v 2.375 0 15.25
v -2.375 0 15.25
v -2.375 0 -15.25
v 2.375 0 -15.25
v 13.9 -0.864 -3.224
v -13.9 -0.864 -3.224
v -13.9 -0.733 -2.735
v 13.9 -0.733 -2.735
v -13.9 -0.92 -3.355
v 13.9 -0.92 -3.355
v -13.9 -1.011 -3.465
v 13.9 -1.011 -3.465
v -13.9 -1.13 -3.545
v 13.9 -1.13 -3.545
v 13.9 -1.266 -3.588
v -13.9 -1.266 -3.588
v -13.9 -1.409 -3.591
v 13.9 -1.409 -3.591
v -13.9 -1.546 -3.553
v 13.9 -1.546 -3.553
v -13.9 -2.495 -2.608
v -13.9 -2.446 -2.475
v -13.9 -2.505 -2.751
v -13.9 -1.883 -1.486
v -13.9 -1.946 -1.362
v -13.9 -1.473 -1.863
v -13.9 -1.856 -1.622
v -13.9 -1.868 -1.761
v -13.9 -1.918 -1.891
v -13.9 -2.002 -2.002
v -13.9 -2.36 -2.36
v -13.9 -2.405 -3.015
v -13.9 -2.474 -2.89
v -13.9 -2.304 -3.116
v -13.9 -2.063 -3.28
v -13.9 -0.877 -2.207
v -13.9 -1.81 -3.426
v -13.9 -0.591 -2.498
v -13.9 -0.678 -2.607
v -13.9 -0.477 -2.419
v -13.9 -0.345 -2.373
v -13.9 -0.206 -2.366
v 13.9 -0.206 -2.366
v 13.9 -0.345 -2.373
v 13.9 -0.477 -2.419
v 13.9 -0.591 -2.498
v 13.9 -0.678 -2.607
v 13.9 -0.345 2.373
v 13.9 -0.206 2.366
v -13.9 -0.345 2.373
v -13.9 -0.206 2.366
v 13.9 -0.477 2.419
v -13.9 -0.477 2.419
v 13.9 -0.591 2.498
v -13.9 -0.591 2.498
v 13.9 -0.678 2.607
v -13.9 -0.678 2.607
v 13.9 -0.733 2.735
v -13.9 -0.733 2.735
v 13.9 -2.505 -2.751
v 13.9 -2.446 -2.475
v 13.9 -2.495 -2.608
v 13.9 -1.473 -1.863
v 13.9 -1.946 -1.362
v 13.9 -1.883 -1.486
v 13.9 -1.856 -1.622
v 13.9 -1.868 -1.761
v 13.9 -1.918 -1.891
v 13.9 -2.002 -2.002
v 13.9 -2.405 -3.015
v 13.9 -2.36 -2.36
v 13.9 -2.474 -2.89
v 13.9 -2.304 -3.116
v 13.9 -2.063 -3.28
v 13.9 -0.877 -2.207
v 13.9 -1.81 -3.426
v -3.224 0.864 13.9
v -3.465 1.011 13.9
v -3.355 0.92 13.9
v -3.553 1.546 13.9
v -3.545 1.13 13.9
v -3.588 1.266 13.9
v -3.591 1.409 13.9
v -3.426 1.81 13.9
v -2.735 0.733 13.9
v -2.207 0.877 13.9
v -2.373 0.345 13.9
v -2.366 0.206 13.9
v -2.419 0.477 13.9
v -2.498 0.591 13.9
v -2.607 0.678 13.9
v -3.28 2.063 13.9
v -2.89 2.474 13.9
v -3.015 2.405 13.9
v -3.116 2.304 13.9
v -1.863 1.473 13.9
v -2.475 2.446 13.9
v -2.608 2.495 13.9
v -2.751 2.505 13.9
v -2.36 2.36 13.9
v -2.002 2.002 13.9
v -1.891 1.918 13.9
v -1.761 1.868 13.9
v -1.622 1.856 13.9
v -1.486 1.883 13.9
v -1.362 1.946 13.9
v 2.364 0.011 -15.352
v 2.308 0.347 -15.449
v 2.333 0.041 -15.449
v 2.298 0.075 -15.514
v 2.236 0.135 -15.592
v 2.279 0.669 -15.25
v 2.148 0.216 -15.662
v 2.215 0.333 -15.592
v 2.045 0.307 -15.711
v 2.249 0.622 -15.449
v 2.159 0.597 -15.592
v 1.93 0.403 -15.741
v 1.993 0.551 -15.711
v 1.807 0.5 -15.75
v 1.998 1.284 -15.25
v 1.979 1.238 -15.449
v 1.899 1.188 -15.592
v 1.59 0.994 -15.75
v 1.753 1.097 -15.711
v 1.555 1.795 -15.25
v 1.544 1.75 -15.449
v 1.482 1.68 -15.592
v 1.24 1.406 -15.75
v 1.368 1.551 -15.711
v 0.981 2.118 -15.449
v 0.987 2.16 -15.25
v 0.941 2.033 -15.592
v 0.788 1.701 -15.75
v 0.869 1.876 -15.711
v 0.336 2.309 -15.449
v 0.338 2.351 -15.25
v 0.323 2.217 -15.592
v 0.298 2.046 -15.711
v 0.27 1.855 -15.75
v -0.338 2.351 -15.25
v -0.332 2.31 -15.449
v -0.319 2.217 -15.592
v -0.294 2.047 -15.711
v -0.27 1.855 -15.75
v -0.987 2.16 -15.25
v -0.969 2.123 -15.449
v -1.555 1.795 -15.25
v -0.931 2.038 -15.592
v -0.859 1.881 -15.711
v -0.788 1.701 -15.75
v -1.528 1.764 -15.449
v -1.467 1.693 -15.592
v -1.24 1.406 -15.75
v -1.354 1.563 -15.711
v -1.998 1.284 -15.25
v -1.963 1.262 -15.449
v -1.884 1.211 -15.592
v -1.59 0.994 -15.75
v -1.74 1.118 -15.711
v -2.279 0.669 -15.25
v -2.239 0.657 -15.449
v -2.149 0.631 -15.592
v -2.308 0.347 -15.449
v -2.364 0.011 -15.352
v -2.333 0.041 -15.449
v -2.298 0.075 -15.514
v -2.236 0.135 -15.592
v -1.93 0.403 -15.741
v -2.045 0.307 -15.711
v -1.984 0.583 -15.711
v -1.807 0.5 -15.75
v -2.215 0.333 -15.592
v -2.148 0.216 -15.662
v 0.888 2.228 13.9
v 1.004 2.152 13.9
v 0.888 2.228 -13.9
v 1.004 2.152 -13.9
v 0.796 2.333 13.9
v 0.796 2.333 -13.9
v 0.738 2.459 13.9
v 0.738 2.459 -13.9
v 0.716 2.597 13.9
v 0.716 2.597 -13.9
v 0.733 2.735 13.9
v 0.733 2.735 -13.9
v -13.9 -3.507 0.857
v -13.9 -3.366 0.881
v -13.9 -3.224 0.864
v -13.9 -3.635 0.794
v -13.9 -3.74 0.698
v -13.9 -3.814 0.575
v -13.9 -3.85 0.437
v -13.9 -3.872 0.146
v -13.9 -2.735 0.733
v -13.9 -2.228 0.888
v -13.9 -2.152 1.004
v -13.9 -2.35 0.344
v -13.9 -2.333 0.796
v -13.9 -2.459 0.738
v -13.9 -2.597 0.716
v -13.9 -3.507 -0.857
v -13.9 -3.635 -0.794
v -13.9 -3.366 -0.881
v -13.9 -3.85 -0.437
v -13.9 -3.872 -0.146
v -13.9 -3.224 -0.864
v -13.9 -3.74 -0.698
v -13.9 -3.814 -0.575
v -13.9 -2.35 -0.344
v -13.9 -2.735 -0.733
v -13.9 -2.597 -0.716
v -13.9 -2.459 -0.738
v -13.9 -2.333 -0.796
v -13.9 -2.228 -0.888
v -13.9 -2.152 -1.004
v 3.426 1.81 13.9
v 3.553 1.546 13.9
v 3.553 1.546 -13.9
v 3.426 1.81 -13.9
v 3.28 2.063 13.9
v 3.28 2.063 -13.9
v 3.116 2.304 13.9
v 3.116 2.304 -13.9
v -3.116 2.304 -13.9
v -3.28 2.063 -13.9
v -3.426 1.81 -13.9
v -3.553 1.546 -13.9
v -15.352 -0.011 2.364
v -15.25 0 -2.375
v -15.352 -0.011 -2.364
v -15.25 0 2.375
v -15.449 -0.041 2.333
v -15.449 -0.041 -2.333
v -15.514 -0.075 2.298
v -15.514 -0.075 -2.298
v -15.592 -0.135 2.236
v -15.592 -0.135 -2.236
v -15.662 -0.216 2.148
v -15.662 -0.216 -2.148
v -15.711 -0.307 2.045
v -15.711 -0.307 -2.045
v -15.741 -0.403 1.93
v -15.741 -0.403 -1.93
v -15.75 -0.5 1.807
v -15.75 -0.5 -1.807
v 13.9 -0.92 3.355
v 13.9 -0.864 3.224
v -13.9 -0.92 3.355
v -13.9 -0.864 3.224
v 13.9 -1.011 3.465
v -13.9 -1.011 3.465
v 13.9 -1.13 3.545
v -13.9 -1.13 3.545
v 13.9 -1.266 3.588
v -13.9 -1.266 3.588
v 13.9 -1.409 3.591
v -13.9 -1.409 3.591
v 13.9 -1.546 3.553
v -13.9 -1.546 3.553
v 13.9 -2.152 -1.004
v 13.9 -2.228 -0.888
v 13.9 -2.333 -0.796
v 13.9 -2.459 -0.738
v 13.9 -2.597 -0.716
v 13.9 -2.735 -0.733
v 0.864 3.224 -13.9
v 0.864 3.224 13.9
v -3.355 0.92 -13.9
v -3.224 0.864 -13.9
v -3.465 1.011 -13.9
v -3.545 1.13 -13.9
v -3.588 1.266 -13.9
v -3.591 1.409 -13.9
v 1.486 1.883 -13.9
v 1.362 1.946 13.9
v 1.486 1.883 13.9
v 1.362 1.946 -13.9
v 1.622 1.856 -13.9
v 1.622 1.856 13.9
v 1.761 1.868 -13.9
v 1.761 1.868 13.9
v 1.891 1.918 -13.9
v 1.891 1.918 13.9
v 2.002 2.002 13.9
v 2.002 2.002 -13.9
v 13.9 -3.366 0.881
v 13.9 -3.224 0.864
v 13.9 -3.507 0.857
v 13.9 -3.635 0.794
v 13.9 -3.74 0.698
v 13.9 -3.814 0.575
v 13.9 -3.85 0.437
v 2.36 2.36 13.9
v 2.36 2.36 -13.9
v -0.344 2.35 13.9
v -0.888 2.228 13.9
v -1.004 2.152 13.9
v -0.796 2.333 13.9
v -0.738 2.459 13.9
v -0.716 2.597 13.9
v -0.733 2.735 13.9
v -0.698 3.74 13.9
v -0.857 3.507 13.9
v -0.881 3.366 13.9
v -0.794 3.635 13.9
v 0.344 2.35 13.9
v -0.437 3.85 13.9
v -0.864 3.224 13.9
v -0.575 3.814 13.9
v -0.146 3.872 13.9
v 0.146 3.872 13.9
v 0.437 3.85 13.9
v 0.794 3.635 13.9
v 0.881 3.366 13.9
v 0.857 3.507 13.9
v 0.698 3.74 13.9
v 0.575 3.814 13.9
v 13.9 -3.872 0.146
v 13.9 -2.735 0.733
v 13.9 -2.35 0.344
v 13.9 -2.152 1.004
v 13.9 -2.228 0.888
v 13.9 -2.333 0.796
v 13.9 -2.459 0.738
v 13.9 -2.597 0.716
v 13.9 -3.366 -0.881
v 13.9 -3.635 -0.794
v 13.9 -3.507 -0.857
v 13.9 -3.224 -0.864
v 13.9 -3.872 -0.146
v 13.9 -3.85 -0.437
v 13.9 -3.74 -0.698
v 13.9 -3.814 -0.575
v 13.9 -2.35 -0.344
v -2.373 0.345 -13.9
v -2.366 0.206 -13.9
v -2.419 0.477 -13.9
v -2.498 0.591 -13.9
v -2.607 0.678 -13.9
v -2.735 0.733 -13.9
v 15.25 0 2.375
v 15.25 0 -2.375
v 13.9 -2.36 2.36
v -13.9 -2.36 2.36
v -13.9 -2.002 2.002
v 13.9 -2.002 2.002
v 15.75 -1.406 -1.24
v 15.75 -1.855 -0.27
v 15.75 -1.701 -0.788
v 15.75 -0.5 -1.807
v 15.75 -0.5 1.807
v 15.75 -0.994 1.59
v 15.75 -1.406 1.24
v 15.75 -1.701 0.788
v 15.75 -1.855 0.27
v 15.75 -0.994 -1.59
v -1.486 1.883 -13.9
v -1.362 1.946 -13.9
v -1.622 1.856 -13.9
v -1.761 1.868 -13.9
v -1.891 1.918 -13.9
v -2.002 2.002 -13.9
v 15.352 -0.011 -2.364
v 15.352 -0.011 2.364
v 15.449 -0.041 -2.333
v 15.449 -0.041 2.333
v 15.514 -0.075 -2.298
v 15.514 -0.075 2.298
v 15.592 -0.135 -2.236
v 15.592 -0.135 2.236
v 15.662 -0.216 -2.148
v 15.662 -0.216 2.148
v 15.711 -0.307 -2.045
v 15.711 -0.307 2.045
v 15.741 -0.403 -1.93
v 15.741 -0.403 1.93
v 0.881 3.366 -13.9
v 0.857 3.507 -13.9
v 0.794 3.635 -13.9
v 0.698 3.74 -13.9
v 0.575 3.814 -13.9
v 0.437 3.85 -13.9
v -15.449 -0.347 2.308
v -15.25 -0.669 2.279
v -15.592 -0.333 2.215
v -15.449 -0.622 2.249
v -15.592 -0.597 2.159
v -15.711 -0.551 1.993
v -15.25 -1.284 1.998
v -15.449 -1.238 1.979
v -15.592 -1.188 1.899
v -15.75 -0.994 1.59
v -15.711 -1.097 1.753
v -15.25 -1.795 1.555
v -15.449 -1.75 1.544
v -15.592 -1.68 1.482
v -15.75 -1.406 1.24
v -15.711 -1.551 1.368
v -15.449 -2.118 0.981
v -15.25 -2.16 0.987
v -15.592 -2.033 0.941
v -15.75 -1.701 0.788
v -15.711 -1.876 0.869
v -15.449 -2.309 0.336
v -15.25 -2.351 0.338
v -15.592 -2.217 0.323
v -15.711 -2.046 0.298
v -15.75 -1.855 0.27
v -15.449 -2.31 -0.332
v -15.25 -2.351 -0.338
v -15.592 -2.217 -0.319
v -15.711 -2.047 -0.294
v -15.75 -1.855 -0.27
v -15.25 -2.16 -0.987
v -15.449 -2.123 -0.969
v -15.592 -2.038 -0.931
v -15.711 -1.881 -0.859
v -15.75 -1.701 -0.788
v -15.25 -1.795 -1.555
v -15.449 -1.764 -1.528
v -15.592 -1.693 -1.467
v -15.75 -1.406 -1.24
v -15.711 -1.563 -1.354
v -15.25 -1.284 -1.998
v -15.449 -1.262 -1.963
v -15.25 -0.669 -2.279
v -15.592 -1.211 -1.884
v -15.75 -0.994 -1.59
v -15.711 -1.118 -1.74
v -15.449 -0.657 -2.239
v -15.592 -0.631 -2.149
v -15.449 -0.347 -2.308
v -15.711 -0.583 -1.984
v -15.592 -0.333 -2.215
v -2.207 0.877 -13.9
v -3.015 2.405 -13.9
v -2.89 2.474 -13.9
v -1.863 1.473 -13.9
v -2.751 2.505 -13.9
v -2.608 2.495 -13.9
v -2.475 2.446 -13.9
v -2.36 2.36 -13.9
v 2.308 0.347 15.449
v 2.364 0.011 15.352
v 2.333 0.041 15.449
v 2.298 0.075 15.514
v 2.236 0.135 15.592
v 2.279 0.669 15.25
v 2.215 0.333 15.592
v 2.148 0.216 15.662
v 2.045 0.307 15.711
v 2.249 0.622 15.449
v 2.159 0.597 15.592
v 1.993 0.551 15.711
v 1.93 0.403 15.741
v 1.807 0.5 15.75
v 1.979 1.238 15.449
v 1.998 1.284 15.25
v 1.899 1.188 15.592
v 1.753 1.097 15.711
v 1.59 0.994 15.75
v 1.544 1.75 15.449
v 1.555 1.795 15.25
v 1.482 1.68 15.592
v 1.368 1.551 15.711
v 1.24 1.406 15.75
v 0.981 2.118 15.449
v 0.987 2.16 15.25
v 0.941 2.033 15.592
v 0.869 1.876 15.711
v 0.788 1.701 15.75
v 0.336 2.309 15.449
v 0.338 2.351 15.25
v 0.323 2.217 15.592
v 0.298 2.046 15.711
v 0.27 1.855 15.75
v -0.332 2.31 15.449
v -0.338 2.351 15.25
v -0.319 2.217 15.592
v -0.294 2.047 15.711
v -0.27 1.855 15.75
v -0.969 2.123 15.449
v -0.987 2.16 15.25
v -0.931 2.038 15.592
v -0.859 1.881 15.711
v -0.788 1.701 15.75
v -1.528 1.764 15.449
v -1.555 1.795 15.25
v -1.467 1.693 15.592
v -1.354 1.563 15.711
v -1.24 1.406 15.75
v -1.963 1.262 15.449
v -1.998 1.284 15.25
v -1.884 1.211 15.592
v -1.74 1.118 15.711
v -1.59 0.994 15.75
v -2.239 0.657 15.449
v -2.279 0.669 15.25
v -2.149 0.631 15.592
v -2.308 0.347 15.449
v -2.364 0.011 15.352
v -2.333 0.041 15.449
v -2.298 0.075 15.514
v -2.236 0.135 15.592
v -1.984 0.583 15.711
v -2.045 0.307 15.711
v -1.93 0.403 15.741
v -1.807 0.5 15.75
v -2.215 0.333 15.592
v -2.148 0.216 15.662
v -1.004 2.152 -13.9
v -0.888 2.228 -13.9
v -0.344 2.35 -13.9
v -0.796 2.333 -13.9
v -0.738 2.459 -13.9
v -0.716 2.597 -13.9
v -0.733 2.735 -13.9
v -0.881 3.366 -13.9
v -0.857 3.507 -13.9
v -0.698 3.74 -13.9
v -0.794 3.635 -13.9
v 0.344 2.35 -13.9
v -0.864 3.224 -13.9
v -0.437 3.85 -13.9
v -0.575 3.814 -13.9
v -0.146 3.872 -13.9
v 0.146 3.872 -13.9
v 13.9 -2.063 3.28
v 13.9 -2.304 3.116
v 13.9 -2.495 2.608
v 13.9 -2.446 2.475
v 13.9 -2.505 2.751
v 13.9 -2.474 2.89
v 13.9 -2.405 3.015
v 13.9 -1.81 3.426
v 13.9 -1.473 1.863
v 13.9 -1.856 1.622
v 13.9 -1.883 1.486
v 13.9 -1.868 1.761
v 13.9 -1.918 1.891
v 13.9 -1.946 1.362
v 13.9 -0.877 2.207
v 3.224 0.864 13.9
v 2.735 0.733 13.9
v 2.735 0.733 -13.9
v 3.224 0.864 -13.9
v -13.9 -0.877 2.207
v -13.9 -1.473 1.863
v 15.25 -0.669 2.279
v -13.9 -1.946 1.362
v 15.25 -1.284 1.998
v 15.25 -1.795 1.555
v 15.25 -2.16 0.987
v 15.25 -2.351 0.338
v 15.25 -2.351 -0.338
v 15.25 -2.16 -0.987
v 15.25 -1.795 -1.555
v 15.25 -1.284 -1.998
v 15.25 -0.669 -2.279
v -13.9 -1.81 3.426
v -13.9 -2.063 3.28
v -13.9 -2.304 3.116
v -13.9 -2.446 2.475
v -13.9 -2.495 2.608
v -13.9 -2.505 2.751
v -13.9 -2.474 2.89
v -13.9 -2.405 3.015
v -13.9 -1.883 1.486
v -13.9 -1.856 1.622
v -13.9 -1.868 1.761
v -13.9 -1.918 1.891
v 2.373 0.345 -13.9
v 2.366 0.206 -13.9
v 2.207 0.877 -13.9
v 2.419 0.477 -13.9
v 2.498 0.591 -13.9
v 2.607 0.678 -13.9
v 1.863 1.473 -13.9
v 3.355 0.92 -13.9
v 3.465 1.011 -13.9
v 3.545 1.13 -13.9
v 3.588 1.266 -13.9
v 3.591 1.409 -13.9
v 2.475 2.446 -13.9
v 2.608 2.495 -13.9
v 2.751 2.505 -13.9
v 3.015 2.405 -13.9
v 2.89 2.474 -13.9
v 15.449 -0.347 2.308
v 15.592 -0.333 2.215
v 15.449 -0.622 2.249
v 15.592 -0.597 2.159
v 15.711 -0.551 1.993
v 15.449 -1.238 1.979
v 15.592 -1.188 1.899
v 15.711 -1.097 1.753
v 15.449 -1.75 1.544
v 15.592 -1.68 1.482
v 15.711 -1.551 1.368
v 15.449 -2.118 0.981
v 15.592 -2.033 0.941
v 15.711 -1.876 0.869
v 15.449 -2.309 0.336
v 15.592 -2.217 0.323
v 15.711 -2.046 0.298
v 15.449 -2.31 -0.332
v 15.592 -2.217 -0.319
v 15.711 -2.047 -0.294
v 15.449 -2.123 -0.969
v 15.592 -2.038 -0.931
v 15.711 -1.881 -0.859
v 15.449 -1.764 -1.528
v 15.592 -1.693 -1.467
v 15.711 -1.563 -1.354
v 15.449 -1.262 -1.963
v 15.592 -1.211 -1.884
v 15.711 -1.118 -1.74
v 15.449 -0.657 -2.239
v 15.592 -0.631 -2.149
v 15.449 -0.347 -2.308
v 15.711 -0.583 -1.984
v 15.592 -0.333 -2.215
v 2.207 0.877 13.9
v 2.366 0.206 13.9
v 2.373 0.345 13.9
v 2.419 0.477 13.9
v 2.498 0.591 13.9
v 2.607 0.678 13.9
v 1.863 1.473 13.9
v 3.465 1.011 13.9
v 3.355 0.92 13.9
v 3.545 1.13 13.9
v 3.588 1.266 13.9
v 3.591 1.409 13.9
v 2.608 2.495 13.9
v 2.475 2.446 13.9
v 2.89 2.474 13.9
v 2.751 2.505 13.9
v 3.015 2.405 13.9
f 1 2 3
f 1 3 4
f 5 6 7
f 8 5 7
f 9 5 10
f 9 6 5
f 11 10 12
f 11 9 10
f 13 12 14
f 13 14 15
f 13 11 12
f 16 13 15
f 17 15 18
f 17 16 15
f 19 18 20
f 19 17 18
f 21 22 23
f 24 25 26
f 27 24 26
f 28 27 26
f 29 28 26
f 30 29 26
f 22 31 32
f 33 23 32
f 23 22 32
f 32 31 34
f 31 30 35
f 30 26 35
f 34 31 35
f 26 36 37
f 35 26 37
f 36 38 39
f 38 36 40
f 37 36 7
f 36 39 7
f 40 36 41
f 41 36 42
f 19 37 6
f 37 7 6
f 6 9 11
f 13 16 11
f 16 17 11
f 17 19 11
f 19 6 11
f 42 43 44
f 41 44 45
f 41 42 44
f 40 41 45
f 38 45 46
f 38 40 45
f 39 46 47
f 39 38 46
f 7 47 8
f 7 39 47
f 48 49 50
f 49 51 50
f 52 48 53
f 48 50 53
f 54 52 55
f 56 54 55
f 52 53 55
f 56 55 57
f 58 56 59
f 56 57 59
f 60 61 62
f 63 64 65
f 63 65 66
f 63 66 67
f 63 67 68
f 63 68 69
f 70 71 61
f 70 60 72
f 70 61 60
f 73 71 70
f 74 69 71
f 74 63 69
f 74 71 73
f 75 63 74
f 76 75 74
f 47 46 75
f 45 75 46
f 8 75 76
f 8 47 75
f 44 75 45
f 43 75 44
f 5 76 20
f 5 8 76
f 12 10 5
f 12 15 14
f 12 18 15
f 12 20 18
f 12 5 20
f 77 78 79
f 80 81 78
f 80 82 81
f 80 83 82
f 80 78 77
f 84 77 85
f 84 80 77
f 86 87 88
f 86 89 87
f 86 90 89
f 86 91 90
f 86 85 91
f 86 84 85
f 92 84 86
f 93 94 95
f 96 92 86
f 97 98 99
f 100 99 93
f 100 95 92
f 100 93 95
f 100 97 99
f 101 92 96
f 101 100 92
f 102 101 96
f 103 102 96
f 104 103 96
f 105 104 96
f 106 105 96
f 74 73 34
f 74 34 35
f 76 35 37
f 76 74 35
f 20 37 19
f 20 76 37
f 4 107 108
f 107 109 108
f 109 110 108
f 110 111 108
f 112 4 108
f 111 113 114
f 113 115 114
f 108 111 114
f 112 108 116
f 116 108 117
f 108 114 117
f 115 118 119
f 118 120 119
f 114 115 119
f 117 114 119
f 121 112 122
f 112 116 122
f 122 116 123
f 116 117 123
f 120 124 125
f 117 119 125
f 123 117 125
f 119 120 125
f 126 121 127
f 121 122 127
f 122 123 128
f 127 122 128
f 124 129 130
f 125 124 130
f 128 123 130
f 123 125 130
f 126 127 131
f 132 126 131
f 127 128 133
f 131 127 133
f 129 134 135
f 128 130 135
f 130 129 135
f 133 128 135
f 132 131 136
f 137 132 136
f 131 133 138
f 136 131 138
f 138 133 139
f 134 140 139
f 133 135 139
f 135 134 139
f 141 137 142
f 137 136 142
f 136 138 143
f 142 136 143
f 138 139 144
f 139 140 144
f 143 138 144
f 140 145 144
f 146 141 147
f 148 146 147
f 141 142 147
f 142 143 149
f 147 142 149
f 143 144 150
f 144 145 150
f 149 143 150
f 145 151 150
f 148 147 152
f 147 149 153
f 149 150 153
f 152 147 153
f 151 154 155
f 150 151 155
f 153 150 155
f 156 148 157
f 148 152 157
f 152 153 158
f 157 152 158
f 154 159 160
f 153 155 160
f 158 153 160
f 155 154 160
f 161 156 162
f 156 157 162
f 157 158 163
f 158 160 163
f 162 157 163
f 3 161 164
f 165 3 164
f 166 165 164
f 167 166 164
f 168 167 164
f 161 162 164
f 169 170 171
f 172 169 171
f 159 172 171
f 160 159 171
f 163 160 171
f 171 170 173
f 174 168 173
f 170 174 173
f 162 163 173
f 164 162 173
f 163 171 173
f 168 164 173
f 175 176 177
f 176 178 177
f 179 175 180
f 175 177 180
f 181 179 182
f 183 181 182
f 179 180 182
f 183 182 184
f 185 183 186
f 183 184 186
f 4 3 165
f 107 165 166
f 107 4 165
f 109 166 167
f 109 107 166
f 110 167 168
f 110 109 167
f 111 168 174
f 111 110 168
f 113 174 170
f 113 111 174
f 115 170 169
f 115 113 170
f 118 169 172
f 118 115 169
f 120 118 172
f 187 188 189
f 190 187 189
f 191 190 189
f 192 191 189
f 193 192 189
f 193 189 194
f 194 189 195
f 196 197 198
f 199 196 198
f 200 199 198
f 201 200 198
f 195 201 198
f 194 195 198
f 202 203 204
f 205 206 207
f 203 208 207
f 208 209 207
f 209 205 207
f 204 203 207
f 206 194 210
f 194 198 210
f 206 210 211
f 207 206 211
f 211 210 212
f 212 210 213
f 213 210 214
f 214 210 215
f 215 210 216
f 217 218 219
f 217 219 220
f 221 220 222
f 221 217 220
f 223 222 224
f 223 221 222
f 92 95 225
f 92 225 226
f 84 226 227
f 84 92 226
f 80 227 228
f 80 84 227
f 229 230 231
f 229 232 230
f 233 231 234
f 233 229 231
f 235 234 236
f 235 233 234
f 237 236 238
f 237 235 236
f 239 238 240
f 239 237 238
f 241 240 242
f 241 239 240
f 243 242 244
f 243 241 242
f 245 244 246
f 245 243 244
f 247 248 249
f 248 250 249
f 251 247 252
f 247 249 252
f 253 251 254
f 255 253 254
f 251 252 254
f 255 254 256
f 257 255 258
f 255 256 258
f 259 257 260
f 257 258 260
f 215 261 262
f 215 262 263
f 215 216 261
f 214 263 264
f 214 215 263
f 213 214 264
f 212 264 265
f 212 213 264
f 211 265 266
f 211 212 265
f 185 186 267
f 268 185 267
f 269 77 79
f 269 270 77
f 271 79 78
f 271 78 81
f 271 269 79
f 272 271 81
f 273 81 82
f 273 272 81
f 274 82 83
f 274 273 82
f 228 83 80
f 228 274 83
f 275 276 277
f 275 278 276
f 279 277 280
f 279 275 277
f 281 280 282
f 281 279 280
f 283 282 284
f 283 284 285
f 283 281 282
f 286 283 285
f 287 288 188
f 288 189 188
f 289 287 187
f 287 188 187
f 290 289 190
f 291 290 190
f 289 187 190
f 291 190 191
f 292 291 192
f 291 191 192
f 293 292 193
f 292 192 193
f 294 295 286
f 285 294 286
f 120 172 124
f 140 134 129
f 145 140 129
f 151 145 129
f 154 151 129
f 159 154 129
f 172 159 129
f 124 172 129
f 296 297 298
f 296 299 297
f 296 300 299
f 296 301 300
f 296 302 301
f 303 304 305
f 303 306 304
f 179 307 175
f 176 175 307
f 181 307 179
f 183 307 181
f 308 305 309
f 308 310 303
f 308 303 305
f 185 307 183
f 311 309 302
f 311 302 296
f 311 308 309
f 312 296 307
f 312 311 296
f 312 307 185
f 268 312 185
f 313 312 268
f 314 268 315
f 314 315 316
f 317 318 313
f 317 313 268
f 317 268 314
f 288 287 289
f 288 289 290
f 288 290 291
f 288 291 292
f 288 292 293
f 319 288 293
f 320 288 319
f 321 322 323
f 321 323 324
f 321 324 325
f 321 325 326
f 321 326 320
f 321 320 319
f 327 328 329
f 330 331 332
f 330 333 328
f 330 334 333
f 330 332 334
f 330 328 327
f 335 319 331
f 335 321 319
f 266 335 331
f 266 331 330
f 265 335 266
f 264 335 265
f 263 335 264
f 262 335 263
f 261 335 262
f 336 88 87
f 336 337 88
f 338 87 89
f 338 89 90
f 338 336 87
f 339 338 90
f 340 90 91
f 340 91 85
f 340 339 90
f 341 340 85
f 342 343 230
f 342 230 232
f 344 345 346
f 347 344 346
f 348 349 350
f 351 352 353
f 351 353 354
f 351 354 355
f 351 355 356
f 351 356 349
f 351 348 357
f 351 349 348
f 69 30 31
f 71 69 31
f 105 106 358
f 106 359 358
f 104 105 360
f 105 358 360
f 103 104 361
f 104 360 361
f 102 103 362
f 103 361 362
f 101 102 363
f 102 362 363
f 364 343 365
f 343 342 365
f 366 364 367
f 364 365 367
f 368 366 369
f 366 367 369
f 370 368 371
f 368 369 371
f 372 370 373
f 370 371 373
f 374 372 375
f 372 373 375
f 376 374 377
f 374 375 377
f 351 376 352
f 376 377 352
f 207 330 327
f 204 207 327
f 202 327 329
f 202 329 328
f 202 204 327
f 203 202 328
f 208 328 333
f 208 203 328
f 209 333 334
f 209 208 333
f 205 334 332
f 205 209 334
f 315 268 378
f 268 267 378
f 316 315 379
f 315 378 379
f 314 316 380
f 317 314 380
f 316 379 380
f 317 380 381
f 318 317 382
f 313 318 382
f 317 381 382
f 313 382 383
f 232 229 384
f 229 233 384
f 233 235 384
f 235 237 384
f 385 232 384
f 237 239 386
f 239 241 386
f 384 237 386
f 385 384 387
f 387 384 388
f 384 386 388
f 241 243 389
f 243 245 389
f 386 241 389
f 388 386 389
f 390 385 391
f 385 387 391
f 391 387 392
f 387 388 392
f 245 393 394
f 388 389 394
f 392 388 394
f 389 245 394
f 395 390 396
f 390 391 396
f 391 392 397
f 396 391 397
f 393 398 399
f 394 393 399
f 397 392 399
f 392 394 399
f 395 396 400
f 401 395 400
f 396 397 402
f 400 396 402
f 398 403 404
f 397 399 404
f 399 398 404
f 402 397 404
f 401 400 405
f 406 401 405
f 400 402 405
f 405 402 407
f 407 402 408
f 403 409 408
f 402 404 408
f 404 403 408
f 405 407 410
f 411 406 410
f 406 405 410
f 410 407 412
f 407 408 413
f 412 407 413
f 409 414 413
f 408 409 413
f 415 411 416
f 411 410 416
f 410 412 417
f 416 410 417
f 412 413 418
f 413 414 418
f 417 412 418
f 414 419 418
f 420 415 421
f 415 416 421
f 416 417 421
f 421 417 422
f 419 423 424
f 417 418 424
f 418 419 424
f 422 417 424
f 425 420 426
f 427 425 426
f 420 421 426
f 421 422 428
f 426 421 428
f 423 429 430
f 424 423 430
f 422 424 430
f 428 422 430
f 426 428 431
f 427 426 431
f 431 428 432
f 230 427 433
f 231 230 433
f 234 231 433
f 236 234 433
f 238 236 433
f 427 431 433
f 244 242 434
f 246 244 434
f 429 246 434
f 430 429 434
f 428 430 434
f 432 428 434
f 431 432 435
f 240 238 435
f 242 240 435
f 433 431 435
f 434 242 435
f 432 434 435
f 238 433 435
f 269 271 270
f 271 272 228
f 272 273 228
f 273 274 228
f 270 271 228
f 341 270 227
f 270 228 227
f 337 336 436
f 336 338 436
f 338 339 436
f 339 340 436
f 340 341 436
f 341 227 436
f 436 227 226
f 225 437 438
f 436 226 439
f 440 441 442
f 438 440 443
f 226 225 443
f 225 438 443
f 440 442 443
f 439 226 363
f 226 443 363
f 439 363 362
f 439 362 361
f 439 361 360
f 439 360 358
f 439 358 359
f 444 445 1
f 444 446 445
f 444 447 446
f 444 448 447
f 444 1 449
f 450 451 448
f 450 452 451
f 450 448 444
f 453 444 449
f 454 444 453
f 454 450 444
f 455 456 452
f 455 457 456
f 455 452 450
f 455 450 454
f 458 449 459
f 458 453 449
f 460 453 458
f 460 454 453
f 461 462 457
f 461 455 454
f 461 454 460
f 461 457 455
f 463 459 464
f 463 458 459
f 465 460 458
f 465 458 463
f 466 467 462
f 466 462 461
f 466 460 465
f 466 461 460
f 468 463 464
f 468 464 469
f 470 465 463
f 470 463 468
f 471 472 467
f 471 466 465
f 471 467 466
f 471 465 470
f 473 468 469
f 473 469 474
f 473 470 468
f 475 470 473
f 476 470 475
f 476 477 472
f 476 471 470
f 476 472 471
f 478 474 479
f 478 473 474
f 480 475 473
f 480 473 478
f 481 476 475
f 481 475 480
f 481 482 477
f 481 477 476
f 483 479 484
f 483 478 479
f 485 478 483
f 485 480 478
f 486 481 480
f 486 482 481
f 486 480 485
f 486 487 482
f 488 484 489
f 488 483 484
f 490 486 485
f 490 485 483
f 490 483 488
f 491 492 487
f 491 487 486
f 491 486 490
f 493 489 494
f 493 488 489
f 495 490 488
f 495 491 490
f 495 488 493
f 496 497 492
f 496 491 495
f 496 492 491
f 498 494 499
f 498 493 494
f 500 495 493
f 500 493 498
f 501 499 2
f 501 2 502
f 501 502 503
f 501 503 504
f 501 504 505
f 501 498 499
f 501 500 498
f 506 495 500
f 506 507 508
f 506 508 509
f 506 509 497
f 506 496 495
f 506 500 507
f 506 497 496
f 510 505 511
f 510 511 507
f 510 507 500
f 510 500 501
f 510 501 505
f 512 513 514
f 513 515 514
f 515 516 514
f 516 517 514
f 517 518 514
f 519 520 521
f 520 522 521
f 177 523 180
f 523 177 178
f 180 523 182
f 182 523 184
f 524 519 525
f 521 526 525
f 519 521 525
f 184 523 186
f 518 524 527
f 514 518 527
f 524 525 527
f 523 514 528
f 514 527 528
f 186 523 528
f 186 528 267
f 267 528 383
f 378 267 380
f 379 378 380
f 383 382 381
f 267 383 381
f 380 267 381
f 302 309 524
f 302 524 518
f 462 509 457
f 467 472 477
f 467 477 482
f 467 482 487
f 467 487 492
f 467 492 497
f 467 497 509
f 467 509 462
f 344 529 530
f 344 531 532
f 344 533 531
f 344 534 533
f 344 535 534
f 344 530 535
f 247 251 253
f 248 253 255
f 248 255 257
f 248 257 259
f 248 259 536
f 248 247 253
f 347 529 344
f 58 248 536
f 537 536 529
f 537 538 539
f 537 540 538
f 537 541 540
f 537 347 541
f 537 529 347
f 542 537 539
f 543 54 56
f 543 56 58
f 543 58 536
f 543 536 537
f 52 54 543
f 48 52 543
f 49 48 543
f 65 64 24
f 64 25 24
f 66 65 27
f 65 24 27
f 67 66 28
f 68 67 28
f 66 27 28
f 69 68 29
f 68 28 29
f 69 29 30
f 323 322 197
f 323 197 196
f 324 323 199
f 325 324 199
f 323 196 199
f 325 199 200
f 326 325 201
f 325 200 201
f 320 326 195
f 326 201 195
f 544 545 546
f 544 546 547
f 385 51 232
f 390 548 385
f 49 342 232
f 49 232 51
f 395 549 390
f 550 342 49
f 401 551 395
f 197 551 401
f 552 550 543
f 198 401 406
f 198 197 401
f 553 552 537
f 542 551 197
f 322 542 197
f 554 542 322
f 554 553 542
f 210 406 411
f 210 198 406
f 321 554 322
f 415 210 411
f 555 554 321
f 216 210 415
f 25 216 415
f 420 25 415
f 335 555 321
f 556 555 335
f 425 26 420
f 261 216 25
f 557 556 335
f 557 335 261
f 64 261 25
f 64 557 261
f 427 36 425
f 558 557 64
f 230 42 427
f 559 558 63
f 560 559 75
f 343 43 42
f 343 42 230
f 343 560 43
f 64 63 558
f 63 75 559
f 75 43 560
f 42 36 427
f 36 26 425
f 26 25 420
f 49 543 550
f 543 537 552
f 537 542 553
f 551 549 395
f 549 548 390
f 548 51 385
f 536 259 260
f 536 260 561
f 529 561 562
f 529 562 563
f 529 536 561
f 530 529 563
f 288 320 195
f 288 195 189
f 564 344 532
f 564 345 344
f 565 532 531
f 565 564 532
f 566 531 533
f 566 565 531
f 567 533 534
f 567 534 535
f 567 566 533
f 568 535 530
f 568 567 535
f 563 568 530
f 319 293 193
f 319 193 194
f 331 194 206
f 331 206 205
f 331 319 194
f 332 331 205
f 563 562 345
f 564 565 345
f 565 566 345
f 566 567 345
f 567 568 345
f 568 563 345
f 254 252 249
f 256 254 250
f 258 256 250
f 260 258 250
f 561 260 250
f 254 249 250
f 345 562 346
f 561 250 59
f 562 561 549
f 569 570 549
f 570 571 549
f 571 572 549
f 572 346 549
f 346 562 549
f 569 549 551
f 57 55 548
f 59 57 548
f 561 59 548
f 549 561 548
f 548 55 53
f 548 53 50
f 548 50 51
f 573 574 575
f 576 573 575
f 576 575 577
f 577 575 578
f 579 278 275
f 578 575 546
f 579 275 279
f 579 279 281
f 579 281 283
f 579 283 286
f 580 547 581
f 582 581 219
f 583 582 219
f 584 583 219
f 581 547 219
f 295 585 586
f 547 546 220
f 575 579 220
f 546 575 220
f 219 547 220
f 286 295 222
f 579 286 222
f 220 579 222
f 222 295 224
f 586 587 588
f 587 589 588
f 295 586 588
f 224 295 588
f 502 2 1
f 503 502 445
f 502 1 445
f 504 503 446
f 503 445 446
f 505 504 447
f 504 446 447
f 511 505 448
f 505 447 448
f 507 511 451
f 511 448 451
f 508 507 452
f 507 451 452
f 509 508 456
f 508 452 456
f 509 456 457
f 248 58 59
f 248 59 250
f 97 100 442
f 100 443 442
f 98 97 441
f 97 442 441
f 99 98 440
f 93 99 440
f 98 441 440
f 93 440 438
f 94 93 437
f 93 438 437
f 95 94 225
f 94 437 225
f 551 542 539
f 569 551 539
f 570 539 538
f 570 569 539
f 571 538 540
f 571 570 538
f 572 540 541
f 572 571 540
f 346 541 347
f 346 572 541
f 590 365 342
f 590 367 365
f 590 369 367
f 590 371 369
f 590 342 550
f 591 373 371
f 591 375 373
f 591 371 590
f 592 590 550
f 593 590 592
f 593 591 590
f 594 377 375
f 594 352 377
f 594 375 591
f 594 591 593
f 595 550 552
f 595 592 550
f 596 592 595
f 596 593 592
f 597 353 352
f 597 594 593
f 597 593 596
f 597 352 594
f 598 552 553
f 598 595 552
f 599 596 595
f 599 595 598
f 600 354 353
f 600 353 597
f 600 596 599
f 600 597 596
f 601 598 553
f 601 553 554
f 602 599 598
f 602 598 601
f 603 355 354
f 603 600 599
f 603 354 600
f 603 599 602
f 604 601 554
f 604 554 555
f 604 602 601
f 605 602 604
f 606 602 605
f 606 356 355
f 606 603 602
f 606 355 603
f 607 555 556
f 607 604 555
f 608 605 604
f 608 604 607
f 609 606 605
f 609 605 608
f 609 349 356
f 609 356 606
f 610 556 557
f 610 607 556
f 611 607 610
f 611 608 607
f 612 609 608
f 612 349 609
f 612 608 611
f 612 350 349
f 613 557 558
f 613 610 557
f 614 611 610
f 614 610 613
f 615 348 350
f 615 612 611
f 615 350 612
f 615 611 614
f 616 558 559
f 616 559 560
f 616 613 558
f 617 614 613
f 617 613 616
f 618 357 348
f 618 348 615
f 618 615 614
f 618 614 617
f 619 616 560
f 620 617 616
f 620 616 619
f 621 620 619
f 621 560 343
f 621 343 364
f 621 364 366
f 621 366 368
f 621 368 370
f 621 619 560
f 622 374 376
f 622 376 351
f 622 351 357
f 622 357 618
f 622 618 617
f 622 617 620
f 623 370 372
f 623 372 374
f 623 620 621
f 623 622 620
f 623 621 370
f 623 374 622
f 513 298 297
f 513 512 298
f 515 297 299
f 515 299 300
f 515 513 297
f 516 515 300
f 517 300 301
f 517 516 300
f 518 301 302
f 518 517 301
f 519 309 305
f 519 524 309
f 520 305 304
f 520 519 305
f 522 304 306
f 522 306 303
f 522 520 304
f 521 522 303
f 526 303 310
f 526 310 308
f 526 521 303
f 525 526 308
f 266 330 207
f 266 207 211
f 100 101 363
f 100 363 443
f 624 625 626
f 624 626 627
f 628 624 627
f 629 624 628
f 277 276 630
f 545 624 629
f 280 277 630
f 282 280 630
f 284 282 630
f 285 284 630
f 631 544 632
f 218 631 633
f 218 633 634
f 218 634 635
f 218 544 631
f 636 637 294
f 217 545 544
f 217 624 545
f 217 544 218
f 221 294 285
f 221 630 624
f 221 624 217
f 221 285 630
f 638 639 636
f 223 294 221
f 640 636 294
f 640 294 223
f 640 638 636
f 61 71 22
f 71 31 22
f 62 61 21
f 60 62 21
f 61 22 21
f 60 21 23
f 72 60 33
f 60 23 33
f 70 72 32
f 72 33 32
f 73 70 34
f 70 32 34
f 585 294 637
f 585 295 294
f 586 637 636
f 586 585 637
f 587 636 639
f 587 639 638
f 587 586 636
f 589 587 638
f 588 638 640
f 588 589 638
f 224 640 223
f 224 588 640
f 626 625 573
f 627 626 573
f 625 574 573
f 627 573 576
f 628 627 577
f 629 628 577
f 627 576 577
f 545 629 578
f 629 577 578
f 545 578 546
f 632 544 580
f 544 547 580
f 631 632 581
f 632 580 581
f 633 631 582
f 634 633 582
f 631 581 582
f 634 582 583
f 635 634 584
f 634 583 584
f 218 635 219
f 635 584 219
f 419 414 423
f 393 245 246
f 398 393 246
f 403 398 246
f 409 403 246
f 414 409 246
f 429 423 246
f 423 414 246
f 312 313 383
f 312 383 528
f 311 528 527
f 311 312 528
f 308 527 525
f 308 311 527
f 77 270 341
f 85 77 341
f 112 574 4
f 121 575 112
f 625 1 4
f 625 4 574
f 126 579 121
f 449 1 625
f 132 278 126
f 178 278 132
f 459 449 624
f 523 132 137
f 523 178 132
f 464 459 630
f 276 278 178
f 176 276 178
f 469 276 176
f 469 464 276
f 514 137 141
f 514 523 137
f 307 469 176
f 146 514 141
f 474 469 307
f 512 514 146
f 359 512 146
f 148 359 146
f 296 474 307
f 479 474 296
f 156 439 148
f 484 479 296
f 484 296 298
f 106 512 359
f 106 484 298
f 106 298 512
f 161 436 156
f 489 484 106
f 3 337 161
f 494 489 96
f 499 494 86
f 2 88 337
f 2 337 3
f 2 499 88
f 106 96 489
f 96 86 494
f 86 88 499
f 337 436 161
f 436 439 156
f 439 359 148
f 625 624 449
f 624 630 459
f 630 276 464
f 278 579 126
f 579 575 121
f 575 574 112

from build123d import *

# Parameters (mm, degrees)
BOSS_EXTRUDE9_START  = 1.85
BOSS_EXTRUDE9_DEPTH  = 31.5
BOSS_EXTRUDE10_DEPTH = 27.8
FILLET4_R            = 0.5
BOSS_EXTRUDE11_DEPTH = 31.5
BOSS_EXTRUDE12_START = -1.85
BOSS_EXTRUDE12_DEPTH = 27.8
FILLET5_R            = 0.5


with BuildPart() as part:
    # Sketch10 → Boss-Extrude9 (new body)
    with BuildSketch(Plane(origin=(13.899999999999999, 0, 0), x_dir=(0, 0, -1), z_dir=(1, 0, 0)).offset(BOSS_EXTRUDE9_START)):
        with BuildLine():
            Line((2.375, 0), (-2.375, 0))
            ThreePointArc((-2.375, 0), (-2.3546815457628005, -0.30999970652261516), (-2.2940738374365415, -0.6146952321184724))
            ThreePointArc((-2.294073837436541, -0.6146952321184722), (-2.0568103339880484, -1.1874999999999882), (-1.679378605318059, -1.6793786053180417))
            ThreePointArc((-1.6793786053180593, -1.6793786053180415), (-1.1875000000000056, -2.0568103339880377), (-0.614695232118488, -2.294073837436537))
            ThreePointArc((-0.6146952321184879, -2.294073837436537), (8e-16, -2.375), (0.6146952321184889, -2.2940738374365366))
            ThreePointArc((0.6146952321184891, -2.2940738374365366), (1.1874999999999993, -2.0568103339880426), (1.6793786053180475, -1.679378605318053))
            ThreePointArc((1.679378605318047, -1.6793786053180533), (2.0568103339880404, -1.1875000000000027), (2.2940738374365366, -0.6146952321184884))
            ThreePointArc((2.294073837436536, -0.6146952321184882), (2.3546815457627996, -0.30999970652262326), (2.374999999999999, 1.5e-16))
        make_face()
    extrude(amount=-BOSS_EXTRUDE9_DEPTH)

    # Sketch10<3> → Boss-Extrude10 (add)
    with BuildSketch(Plane(origin=(13.899999999999999, 0, 0), x_dir=(0, 0, -1), z_dir=(1, 0, 0))):
        with BuildLine():
            Line((3.742962576870139, -1.0029237997722704), (2.2940738374365366, -0.6146952321184883))
            ThreePointArc((2.2940738374365366, -0.6146952321184884), (2.0568103339880404, -1.1875000000000027), (1.679378605318047, -1.6793786053180533))
            Line((1.6793786053180473, -1.6793786053180535), (2.740038777097866, -2.740038777097877))
            ThreePointArc((2.740038777097866, -2.7400387770978774), (3.3558484396646966, -1.937500000000004), (3.7429625768701396, -1.0029237997722706))
        make_face()
        with BuildLine():
            ThreePointArc((0.6146952321184889, -2.2940738374365366), (8e-16, -2.375), (-0.6146952321184879, -2.294073837436537))
            Line((-0.6146952321184881, -2.294073837436537), (-1.00292379977227, -3.7429625768701387))
            ThreePointArc((-1.0029237997722702, -3.7429625768701396), (9.4e-16, -3.874999999999999), (1.0029237997722722, -3.7429625768701387))
            Line((1.0029237997722715, -3.7429625768701382), (0.614695232118489, -2.2940738374365366))
        make_face()
        with BuildLine():
            ThreePointArc((-1.679378605318059, -1.6793786053180417), (-2.0568103339880484, -1.1874999999999882), (-2.294073837436541, -0.6146952321184722))
            Line((-2.294073837436541, -0.6146952321184723), (-3.7429625768701458, -1.002923799772244))
            ThreePointArc((-3.7429625768701453, -1.002923799772244), (-3.3558484396647104, -1.937499999999981), (-2.7400387770978853, -2.740038777097858))
            Line((-2.740038777097886, -2.740038777097858), (-1.6793786053180595, -1.6793786053180415))
        make_face()
    extrude(amount=-BOSS_EXTRUDE10_DEPTH)

    # Fillet4
    fillet4_edges = [part.edges().sort_by_distance(p)[0] for p in [
        (-15.75, 0, 0),
        (-1.78e-15, -1.6793786053180533, -1.6793786053180475),
        (-1.78e-15, -0.6146952321184884, -2.2940738374365366),
        (-1.78e-15, -1.0029237997722706, -3.7429625768701396),
        (-1.78e-15, -2.740038777097877, -2.7400387770978663),
        (-1.78e-15, -2.294073837436537, 0.614695232118488),
        (-1.78e-15, -2.2940738374365366, -0.6146952321184889),
        (-1.78e-15, -3.7429625768701387, -1.002923799772272),
        (-1.78e-15, -3.7429625768701396, 1.0029237997722702),
        (-1.78e-15, -0.6146952321184724, 2.2940738374365415),
        (-1.78e-15, -1.6793786053180417, 1.6793786053180595),
        (-1.78e-15, -2.740038777097858, 2.740038777097886),
        (-1.78e-15, -1.002923799772244, 3.7429625768701458),
        (15.749999999999998, 0, 0),
        (15.749999999999998, -2.3749999999999236, -8.83e-14),
        (-15.75, -2.375000000000048, -5.294e-14),
    ]]
    fillet(fillet4_edges, radius=FILLET4_R)


with BuildPart() as body_2:
    # Sketch12 → Boss-Extrude11 (new body)
    with BuildSketch(Plane.XY.offset(15.75)):
        with BuildLine():
            ThreePointArc((-2.2940738374365424, 0.6146952321184705), (-2.3546815457628014, 0.3099997065226141), (-2.375, 1e-17))
            Line((-2.375, 0), (2.375, 0))
            ThreePointArc((2.375, 0), (2.354681545762799, 0.30999970652261893), (2.2940738374365393, 0.61469523211848))
            ThreePointArc((2.2940738374365397, 0.6146952321184802), (2.056810333988045, 1.1874999999999953), (1.6793786053180533, 1.679378605318048))
            ThreePointArc((1.6793786053180533, 1.679378605318048), (1.1875000000000027, 2.0568103339880413), (0.614695232118488, 2.294073837436537))
            ThreePointArc((0.6146952321184886, 2.2940738374365366), (-2.2e-16, 2.375), (-0.6146952321184889, 2.294073837436537))
            ThreePointArc((-0.6146952321184889, 2.294073837436537), (-1.187500000000007, 2.0568103339880386), (-1.67937860531806, 1.6793786053180408))
            ThreePointArc((-1.6793786053180595, 1.6793786053180408), (-2.0568103339880497, 1.1874999999999862), (-2.2940738374365415, 0.61469523211847))
        make_face()
    extrude(amount=-BOSS_EXTRUDE11_DEPTH)

    # Sketch12<3> → Boss-Extrude12 (add)
    with BuildSketch(Plane.XY.offset(15.75).offset(BOSS_EXTRUDE12_START)):
        with BuildLine():
            Line((-3.742962576870146, 1.0029237997722413), (-2.294073837436542, 0.6146952321184705))
            ThreePointArc((-2.2940738374365415, 0.61469523211847), (-2.0568103339880497, 1.1874999999999862), (-1.6793786053180595, 1.6793786053180408))
            Line((-1.67937860531806, 1.6793786053180408), (-2.7400387770978876, 2.740038777097856))
            ThreePointArc((-2.7400387770978876, 2.7400387770978565), (-3.3558484396647126, 1.9374999999999782), (-3.7429625768701467, 1.0029237997722413))
        make_face()
        with BuildLine():
            Line((-1.0029237997722713, 3.742962576870139), (-0.6146952321184889, 2.294073837436537))
            ThreePointArc((-0.6146952321184889, 2.294073837436537), (-2.2e-16, 2.375), (0.6146952321184886, 2.2940738374365366))
            Line((0.6146952321184883, 2.294073837436537), (1.0029237997722704, 3.742962576870139))
            ThreePointArc((1.0029237997722706, 3.74296257687014), (-4.4e-16, 3.875), (-1.0029237997722715, 3.74296257687014))
        make_face()
        with BuildLine():
            ThreePointArc((1.6793786053180533, 1.679378605318048), (2.056810333988045, 1.1874999999999953), (2.2940738374365397, 0.6146952321184802))
            Line((2.2940738374365393, 0.6146952321184801), (3.742962576870143, 1.002923799772257))
            ThreePointArc((3.742962576870143, 1.0029237997722573), (3.3558484396647046, 1.9374999999999925), (2.740038777097876, 2.7400387770978676))
            Line((2.740038777097876, 2.740038777097867), (1.6793786053180533, 1.679378605318048))
        make_face()
    extrude(amount=-BOSS_EXTRUDE12_DEPTH)

    # Fillet5
    fillet5_edges = [body_2.edges().sort_by_distance(p)[0] for p in [
        (0, 0, -15.75),
        (-1.6793786053180597, 1.6793786053180408, 0),
        (-2.294073837436542, 0.6146952321184704, 0),
        (-3.7429625768701467, 1.0029237997722418, 0),
        (-2.7400387770978876, 2.7400387770978565, 0),
        (0.6146952321184882, 2.2940738374365366, 0),
        (-0.6146952321184889, 2.294073837436537, 0),
        (-1.0029237997722715, 3.7429625768701396, 0),
        (1.0029237997722706, 3.7429625768701396, 0),
        (2.2940738374365397, 0.6146952321184802, 0),
        (1.6793786053180535, 1.679378605318048, 0),
        (2.740038777097876, 2.740038777097867, 0),
        (3.742962576870143, 1.0029237997722573, 0),
        (0, 0, 15.75),
        (-2.154e-14, 2.3749999999999845, 15.75),
        (-1.5212e-13, 2.3750000000001332, -15.75),
    ]]
    fillet(fillet5_edges, radius=FILLET5_R)


solid = Compound([part.part, body_2.part])
